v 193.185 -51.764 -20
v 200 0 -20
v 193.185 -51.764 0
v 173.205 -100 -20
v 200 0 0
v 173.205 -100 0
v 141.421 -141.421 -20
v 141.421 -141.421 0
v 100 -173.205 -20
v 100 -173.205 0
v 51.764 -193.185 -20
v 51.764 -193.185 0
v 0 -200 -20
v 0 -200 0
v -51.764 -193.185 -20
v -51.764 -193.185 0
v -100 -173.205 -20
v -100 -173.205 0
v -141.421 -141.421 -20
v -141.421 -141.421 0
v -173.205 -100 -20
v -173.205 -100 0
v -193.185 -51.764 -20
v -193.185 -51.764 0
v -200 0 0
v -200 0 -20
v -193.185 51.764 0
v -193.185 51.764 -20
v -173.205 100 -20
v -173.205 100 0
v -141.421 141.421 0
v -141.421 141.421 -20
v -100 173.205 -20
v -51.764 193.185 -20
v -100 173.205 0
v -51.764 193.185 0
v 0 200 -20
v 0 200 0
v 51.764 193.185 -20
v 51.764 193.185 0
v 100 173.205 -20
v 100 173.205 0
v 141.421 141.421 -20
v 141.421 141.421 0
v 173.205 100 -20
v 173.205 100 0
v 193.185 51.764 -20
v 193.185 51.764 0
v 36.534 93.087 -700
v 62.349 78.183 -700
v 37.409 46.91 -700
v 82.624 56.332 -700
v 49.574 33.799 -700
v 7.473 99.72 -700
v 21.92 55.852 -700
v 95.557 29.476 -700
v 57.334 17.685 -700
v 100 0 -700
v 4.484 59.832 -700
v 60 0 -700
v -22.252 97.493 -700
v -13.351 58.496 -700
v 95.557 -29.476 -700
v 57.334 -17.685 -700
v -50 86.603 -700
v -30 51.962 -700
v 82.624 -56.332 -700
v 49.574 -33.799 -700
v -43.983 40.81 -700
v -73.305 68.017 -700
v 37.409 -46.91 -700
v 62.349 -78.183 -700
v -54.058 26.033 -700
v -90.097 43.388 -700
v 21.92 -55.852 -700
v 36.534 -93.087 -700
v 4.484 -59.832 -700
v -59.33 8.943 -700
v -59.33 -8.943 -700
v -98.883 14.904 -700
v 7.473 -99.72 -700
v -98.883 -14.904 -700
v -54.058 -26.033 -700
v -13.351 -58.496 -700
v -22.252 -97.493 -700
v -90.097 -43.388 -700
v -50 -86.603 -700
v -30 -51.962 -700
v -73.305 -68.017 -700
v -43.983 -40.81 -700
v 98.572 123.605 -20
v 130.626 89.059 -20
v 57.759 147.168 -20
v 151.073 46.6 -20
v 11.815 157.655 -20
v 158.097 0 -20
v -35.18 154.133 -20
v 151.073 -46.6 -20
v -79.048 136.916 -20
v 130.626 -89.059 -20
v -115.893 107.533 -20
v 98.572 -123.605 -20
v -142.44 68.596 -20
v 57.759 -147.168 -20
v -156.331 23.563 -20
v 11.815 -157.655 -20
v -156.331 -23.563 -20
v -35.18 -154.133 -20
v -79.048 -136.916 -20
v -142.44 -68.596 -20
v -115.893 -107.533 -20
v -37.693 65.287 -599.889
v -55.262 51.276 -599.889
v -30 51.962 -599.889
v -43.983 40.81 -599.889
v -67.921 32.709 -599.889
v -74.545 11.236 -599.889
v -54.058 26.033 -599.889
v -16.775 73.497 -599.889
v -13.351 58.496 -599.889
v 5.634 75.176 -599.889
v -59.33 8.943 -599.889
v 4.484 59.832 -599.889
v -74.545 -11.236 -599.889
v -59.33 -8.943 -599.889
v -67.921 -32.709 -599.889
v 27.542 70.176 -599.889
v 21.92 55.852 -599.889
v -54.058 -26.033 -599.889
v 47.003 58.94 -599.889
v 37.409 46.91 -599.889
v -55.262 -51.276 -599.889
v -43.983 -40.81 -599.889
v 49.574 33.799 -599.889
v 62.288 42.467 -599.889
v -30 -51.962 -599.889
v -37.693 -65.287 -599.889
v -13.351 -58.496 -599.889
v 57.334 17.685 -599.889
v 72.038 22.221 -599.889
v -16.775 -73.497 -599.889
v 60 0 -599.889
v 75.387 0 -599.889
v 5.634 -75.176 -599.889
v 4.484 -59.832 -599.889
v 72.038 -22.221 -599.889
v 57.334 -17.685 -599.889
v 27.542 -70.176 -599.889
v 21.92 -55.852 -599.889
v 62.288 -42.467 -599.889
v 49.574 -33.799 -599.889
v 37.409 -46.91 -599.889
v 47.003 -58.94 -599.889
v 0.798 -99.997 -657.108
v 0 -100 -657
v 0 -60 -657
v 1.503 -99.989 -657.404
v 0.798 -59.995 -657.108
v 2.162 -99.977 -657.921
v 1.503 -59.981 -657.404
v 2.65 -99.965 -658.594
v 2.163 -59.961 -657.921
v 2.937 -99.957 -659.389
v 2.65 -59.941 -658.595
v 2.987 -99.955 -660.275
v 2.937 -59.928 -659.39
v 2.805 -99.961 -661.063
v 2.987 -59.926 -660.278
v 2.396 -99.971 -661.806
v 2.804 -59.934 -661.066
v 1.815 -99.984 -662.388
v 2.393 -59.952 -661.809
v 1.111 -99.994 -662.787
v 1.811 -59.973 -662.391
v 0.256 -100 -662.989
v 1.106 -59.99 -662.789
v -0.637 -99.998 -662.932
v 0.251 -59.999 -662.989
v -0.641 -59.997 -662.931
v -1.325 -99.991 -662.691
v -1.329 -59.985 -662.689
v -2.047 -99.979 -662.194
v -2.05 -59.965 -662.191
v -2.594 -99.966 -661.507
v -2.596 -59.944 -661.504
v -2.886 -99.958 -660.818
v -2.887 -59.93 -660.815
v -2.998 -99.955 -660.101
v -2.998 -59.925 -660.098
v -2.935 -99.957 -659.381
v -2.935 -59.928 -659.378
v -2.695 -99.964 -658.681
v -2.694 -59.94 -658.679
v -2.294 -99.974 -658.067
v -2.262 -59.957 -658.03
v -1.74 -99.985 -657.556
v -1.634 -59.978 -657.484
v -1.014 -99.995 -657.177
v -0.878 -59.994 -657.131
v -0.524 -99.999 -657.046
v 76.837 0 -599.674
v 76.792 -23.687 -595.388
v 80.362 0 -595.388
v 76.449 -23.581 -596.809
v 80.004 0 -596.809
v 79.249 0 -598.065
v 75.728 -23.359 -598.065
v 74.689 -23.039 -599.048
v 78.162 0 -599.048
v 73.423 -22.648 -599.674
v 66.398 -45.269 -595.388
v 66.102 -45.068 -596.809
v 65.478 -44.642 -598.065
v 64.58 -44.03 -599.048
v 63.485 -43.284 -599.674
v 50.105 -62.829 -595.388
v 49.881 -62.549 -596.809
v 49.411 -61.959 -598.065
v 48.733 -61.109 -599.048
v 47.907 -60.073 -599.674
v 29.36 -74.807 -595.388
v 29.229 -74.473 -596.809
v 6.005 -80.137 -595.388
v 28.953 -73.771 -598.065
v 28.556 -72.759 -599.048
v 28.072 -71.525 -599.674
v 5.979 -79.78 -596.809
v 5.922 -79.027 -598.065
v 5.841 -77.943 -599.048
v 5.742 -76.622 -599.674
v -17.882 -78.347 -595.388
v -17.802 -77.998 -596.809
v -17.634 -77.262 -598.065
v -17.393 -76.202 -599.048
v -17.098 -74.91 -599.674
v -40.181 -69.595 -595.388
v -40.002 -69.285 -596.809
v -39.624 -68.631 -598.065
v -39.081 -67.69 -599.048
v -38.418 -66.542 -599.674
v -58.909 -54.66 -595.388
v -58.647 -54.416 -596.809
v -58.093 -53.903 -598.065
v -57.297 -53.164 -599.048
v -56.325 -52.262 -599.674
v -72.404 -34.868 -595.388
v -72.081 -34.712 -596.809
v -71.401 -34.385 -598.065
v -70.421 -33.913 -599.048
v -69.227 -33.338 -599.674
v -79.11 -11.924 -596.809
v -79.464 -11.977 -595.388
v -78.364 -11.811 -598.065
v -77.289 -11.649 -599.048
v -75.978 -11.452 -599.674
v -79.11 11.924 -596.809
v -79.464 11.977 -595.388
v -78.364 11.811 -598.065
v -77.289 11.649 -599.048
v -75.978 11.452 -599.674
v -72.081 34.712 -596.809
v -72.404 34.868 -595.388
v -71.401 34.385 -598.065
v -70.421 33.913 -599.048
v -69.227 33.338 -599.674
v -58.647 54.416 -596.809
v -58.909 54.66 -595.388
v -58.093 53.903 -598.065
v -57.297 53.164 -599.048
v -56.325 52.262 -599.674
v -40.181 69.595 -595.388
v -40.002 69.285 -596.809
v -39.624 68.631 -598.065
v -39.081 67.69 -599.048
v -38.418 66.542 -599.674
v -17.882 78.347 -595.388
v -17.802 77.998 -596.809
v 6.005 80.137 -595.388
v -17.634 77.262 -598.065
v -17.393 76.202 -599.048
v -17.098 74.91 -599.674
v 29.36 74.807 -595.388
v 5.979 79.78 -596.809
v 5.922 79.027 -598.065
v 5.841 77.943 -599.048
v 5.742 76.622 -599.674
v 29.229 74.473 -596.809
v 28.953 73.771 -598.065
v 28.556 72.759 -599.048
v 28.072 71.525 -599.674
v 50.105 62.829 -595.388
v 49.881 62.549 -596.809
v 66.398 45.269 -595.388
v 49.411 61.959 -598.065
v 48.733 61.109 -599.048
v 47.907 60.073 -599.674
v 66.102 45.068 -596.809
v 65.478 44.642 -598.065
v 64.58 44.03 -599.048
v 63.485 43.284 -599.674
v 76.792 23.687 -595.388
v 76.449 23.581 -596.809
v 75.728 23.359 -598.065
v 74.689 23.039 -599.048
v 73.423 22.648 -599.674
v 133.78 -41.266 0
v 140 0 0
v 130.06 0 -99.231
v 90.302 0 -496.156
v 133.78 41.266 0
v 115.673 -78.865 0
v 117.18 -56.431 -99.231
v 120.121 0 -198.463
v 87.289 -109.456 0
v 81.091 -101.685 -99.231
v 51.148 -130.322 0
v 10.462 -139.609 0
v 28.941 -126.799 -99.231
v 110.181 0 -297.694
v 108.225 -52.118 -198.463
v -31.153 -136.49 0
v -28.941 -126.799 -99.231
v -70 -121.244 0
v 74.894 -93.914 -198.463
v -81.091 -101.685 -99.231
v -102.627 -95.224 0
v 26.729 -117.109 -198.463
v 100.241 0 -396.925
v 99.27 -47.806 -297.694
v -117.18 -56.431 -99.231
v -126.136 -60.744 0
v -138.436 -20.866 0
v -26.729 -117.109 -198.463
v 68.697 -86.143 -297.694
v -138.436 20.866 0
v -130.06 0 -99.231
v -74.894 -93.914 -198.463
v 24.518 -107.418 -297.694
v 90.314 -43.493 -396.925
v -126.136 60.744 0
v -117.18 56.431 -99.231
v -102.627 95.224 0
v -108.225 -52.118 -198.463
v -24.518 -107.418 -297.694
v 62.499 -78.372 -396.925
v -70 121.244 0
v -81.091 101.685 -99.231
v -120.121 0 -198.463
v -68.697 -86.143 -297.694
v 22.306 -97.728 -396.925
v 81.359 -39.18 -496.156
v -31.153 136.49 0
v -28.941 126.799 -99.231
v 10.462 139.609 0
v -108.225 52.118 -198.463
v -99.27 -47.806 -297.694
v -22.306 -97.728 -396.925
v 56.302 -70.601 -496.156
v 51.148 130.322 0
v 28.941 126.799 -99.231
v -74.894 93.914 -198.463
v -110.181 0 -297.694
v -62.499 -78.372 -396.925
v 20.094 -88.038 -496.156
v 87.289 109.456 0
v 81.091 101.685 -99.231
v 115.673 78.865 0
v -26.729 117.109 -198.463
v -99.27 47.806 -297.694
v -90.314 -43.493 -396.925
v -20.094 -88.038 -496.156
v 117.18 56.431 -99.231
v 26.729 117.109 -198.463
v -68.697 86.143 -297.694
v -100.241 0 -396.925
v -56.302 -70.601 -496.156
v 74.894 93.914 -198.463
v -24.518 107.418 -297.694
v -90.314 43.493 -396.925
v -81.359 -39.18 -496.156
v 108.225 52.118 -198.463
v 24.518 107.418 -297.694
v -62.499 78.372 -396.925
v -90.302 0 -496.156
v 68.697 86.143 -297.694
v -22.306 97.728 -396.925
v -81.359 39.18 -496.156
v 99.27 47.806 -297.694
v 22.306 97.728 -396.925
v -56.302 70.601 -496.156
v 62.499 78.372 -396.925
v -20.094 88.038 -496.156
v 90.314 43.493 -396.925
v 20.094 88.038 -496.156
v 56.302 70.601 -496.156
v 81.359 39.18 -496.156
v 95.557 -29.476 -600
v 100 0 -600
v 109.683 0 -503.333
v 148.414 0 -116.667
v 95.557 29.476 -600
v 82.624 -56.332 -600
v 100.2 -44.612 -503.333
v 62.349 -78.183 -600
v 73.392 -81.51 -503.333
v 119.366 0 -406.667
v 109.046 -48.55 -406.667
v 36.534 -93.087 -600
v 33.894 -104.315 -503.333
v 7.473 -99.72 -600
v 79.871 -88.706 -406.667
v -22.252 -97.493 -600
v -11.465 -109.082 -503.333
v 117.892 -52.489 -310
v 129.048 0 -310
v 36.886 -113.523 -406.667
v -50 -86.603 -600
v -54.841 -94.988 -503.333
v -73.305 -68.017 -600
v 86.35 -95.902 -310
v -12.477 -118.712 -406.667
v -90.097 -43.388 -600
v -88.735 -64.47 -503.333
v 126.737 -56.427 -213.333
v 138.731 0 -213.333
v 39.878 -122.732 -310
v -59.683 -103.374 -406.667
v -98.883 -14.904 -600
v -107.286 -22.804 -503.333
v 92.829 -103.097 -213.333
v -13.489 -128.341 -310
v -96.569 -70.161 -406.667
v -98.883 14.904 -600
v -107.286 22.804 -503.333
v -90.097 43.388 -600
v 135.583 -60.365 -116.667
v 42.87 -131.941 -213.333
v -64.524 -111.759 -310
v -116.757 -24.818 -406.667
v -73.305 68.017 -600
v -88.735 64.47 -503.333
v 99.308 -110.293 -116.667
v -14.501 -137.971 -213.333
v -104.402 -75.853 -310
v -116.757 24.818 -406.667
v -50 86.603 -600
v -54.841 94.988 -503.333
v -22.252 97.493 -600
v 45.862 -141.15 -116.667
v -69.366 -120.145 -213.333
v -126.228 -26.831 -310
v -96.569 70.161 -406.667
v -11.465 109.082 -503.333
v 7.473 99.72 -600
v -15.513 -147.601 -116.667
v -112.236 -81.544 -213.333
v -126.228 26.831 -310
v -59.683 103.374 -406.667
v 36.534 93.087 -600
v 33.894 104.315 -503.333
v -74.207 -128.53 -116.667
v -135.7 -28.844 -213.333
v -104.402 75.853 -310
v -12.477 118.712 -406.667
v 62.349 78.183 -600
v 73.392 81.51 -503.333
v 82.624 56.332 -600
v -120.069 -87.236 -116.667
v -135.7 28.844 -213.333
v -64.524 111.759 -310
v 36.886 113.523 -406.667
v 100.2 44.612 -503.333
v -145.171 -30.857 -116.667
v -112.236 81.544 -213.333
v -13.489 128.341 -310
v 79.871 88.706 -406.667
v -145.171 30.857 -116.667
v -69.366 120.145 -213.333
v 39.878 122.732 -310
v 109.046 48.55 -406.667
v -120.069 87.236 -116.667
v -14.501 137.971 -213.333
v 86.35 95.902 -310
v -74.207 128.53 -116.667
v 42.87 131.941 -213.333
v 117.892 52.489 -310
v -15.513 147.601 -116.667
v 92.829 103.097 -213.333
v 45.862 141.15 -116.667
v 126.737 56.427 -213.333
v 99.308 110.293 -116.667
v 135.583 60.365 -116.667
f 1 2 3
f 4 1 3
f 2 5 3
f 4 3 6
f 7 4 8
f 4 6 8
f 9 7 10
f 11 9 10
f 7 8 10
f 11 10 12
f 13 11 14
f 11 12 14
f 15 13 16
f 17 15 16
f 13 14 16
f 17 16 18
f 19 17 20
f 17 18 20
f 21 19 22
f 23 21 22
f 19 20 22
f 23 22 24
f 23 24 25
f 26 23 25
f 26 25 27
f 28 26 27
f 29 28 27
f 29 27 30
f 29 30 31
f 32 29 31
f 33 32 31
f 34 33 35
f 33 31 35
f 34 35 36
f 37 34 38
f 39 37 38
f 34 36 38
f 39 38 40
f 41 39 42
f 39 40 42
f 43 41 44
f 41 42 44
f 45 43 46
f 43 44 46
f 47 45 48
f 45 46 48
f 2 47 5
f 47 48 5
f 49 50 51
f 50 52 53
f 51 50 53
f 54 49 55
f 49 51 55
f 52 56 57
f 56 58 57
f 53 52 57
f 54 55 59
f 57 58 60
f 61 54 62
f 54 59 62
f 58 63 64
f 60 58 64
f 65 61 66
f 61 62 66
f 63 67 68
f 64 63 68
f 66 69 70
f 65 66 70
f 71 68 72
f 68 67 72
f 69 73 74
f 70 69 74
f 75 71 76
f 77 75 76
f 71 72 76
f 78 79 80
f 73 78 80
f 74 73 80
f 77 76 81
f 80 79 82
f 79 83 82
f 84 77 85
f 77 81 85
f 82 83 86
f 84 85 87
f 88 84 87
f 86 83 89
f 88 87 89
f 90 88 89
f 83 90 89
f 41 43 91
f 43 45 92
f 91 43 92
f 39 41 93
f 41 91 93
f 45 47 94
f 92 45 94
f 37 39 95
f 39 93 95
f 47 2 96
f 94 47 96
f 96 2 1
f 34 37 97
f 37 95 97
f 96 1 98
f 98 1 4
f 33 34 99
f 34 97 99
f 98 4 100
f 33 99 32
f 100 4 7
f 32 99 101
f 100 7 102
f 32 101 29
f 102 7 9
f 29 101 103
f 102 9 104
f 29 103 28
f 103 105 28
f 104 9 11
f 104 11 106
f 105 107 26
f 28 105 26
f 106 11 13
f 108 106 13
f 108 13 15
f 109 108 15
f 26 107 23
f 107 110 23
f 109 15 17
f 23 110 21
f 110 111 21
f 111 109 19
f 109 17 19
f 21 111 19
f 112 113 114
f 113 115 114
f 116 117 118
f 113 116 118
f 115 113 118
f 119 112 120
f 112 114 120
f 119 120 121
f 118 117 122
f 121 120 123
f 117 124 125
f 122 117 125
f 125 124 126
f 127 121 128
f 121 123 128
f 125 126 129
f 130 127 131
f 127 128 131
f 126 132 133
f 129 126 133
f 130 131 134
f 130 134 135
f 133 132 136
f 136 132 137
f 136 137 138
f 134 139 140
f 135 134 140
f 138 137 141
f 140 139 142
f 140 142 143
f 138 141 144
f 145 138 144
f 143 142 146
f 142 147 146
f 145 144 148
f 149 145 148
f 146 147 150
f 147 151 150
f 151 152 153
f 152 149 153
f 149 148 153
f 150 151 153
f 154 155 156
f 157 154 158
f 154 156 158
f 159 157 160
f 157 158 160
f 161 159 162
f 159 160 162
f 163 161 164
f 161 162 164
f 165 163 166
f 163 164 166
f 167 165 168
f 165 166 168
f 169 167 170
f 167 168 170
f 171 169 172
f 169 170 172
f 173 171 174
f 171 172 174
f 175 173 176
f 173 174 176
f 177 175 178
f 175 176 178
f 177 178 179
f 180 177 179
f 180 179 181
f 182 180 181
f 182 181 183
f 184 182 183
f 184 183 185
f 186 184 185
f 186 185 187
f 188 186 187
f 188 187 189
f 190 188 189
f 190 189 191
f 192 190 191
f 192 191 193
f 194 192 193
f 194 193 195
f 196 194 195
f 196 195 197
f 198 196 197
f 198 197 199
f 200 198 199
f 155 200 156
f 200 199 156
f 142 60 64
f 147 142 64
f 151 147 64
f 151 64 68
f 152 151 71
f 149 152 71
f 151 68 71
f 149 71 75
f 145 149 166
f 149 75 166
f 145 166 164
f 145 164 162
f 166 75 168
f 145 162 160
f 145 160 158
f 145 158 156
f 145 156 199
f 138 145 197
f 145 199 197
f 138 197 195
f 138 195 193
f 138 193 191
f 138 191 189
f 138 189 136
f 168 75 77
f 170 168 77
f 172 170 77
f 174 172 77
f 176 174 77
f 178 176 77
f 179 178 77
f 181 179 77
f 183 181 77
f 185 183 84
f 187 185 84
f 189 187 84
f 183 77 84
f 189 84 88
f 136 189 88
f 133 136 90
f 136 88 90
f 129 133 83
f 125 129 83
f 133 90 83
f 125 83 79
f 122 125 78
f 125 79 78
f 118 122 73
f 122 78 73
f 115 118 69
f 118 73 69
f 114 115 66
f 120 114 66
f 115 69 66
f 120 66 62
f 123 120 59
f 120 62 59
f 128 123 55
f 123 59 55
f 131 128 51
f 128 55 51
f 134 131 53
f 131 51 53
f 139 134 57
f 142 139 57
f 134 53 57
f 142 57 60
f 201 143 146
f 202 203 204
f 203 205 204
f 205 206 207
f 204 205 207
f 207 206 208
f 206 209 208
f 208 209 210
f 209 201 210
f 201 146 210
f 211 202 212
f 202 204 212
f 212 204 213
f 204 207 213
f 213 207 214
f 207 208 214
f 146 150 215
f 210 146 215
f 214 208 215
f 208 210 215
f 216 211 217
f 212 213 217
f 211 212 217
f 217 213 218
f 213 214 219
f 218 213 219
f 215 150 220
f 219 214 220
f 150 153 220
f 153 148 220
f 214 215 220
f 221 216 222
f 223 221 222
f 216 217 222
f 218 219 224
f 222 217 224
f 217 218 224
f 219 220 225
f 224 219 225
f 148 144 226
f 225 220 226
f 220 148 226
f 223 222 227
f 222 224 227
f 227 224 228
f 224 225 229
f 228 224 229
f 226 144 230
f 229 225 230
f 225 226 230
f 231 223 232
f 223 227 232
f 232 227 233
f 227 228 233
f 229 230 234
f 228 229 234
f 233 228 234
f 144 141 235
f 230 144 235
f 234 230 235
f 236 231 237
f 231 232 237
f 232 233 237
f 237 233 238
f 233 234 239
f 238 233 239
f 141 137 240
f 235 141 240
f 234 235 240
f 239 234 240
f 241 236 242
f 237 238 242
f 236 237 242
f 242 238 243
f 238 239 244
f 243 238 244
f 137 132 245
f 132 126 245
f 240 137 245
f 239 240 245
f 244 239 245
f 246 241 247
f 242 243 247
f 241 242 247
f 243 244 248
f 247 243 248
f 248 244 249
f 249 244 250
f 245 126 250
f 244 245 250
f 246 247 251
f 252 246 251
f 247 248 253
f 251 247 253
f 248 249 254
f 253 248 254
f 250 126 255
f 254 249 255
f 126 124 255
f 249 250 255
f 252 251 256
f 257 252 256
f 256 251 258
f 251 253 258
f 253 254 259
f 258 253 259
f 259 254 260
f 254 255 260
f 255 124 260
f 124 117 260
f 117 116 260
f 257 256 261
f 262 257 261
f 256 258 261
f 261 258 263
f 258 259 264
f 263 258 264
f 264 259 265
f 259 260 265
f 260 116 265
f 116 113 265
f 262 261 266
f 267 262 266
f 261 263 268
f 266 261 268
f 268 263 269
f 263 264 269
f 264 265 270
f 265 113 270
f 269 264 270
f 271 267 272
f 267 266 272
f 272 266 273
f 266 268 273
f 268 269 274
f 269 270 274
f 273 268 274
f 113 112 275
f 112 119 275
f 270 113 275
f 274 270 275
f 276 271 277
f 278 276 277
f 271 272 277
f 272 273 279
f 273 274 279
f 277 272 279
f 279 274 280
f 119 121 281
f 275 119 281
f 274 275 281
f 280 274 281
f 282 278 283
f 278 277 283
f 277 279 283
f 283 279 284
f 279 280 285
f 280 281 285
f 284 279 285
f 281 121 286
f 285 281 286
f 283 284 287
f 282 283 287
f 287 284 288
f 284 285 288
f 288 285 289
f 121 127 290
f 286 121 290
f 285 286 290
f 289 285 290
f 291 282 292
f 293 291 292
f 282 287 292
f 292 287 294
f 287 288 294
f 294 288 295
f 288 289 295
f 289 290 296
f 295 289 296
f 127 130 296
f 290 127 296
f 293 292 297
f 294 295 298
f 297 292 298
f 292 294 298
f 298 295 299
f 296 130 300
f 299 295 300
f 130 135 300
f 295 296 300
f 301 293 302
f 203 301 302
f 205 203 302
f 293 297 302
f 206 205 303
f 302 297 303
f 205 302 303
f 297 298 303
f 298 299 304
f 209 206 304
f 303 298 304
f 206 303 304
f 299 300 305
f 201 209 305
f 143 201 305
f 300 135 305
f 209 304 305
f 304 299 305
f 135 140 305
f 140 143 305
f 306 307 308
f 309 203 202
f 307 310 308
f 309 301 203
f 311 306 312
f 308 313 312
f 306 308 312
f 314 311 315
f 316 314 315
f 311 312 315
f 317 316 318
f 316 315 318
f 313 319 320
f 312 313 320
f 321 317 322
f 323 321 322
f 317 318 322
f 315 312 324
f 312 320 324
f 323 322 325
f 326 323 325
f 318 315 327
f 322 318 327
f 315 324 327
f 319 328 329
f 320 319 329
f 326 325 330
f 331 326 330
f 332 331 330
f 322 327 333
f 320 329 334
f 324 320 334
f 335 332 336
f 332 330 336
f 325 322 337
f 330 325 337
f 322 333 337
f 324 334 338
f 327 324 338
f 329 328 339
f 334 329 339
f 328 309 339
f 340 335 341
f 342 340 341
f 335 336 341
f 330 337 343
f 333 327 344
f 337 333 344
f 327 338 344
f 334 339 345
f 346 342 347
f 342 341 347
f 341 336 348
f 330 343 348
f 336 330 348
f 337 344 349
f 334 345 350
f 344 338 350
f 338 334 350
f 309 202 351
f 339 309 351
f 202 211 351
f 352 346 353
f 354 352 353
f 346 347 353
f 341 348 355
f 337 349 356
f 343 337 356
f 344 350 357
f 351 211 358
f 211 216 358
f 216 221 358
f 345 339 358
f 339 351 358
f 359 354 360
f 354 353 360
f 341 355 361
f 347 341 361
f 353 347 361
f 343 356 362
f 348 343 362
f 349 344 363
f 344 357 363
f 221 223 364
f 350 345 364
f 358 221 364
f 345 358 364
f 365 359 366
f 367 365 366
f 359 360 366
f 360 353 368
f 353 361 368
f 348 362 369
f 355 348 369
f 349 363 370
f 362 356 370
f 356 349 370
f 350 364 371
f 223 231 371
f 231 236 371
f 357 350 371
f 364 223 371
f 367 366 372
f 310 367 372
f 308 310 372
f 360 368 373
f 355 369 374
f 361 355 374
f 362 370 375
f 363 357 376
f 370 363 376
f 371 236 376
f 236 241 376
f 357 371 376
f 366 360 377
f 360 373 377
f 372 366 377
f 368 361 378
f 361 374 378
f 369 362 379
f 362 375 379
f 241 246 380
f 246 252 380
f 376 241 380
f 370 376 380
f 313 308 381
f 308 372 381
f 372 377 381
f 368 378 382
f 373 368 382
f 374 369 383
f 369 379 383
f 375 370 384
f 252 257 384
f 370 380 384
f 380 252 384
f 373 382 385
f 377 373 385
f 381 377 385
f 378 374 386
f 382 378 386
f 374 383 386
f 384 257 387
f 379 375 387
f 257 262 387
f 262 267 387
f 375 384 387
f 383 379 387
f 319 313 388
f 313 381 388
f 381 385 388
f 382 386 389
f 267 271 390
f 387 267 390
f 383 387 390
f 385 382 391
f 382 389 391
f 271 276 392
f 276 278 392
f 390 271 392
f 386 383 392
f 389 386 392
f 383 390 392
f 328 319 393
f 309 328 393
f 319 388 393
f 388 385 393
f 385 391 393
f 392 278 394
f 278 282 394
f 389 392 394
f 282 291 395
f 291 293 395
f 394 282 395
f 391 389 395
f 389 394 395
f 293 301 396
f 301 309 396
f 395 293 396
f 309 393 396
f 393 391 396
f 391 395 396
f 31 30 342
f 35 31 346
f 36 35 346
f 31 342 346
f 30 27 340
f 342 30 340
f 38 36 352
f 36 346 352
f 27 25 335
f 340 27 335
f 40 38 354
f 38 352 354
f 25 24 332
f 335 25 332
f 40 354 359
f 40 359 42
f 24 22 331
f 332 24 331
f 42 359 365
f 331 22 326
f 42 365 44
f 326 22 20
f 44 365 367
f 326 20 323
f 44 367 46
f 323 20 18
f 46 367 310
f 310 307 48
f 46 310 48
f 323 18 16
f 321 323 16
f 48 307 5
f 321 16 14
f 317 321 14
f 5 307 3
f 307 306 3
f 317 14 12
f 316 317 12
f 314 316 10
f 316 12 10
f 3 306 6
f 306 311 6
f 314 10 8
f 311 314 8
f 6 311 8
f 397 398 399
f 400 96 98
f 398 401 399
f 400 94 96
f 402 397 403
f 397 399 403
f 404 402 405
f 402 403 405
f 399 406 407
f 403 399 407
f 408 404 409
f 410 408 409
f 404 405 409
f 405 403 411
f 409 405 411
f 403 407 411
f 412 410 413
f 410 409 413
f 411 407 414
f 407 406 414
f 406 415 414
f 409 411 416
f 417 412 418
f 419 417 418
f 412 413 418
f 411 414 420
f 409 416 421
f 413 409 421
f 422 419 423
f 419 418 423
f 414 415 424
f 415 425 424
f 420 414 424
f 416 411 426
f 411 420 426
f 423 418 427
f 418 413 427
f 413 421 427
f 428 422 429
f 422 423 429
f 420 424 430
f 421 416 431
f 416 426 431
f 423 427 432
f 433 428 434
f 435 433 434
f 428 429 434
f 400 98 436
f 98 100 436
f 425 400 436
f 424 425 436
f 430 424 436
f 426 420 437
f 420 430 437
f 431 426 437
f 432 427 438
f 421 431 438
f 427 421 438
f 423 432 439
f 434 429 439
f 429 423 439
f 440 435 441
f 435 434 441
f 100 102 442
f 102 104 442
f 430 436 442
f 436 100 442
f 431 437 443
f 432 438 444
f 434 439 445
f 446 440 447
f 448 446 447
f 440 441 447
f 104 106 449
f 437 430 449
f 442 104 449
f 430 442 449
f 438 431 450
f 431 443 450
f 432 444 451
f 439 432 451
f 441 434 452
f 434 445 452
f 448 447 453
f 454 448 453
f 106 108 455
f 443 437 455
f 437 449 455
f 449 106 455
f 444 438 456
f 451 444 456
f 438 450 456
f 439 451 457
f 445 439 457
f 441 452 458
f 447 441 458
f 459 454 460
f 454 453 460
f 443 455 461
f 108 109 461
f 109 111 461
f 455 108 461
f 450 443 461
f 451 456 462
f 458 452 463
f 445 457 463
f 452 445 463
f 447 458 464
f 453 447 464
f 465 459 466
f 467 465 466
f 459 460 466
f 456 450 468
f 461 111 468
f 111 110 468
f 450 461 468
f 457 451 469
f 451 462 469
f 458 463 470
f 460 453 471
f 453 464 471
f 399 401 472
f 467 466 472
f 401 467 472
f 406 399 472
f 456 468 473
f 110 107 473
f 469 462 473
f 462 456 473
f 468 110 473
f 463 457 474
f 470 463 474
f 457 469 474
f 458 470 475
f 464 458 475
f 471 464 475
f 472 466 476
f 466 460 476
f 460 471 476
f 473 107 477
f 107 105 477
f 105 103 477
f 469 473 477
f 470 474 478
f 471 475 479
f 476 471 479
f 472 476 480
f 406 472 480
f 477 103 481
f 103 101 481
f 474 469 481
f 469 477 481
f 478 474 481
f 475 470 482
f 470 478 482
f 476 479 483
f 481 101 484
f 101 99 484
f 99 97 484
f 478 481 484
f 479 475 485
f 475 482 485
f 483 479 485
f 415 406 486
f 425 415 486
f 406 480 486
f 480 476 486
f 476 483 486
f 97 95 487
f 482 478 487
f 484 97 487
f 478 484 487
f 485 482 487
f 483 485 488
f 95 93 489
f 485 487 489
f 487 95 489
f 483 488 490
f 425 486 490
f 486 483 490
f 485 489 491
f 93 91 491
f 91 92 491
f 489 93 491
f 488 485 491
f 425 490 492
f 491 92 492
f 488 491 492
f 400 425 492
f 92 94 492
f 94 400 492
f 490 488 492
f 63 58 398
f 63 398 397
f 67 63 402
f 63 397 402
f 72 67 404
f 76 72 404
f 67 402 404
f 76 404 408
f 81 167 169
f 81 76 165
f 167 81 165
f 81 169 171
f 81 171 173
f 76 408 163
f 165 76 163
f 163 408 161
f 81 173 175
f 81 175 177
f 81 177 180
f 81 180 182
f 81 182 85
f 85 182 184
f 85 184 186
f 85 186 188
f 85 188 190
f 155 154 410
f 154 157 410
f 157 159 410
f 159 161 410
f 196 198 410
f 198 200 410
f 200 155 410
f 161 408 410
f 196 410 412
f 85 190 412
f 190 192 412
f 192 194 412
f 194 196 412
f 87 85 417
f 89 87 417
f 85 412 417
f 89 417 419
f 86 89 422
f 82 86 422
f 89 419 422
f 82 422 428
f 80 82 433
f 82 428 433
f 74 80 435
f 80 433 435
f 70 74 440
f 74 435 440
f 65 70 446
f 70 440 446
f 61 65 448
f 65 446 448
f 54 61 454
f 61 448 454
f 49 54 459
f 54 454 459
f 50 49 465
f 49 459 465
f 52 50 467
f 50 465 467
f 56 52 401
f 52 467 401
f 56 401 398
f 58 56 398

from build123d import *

# Parameters (mm, degrees)
SKETCH2_R          = 3
CUT_EXTRUDE1_DEPTH = 755.983443527


with BuildPart() as part:
    # Sketch1 → Revolve1 (revolve)
    with BuildSketch(Plane(origin=(0, 0, 0), x_dir=(1, 0, 0), z_dir=(0, 1, 0))):
        with BuildLine():
            Line((60, 700), (100, 700))
            Line((100, 700), (100, 600))
            Line((100, 600), (158.096747357, 20))
            Line((158.096747357, 20), (200, 20))
            Line((200, 20), (200, 0))
            Line((200, 0), (140, 0))
            Line((140, 0), (80.361922702, 595.387631955))
            ThreePointArc((80.361922702, 595.387631955), (78.741539447, 598.596831406), (75.386818985, 599.889291707))
            Line((75.386818985, 599.889291707), (60, 599.889291707))
            Line((60, 599.889291707), (60, 700))
        make_face()
    revolve(axis=Axis((0, 0, 396.040868455), (0, 0, -1)))

    # Sketch2 → Cut-Extrude1 (cut, through all)
    with BuildSketch(Plane(origin=(0, 0, 0), x_dir=(1, 0, 0), z_dir=(0, 1, 0))):
        with Locations(Location((0, 660, 0), (0, 0, 270))):
            Circle(SKETCH2_R)
    extrude(amount=-CUT_EXTRUDE1_DEPTH, mode=Mode.SUBTRACT)


solid = part.part
